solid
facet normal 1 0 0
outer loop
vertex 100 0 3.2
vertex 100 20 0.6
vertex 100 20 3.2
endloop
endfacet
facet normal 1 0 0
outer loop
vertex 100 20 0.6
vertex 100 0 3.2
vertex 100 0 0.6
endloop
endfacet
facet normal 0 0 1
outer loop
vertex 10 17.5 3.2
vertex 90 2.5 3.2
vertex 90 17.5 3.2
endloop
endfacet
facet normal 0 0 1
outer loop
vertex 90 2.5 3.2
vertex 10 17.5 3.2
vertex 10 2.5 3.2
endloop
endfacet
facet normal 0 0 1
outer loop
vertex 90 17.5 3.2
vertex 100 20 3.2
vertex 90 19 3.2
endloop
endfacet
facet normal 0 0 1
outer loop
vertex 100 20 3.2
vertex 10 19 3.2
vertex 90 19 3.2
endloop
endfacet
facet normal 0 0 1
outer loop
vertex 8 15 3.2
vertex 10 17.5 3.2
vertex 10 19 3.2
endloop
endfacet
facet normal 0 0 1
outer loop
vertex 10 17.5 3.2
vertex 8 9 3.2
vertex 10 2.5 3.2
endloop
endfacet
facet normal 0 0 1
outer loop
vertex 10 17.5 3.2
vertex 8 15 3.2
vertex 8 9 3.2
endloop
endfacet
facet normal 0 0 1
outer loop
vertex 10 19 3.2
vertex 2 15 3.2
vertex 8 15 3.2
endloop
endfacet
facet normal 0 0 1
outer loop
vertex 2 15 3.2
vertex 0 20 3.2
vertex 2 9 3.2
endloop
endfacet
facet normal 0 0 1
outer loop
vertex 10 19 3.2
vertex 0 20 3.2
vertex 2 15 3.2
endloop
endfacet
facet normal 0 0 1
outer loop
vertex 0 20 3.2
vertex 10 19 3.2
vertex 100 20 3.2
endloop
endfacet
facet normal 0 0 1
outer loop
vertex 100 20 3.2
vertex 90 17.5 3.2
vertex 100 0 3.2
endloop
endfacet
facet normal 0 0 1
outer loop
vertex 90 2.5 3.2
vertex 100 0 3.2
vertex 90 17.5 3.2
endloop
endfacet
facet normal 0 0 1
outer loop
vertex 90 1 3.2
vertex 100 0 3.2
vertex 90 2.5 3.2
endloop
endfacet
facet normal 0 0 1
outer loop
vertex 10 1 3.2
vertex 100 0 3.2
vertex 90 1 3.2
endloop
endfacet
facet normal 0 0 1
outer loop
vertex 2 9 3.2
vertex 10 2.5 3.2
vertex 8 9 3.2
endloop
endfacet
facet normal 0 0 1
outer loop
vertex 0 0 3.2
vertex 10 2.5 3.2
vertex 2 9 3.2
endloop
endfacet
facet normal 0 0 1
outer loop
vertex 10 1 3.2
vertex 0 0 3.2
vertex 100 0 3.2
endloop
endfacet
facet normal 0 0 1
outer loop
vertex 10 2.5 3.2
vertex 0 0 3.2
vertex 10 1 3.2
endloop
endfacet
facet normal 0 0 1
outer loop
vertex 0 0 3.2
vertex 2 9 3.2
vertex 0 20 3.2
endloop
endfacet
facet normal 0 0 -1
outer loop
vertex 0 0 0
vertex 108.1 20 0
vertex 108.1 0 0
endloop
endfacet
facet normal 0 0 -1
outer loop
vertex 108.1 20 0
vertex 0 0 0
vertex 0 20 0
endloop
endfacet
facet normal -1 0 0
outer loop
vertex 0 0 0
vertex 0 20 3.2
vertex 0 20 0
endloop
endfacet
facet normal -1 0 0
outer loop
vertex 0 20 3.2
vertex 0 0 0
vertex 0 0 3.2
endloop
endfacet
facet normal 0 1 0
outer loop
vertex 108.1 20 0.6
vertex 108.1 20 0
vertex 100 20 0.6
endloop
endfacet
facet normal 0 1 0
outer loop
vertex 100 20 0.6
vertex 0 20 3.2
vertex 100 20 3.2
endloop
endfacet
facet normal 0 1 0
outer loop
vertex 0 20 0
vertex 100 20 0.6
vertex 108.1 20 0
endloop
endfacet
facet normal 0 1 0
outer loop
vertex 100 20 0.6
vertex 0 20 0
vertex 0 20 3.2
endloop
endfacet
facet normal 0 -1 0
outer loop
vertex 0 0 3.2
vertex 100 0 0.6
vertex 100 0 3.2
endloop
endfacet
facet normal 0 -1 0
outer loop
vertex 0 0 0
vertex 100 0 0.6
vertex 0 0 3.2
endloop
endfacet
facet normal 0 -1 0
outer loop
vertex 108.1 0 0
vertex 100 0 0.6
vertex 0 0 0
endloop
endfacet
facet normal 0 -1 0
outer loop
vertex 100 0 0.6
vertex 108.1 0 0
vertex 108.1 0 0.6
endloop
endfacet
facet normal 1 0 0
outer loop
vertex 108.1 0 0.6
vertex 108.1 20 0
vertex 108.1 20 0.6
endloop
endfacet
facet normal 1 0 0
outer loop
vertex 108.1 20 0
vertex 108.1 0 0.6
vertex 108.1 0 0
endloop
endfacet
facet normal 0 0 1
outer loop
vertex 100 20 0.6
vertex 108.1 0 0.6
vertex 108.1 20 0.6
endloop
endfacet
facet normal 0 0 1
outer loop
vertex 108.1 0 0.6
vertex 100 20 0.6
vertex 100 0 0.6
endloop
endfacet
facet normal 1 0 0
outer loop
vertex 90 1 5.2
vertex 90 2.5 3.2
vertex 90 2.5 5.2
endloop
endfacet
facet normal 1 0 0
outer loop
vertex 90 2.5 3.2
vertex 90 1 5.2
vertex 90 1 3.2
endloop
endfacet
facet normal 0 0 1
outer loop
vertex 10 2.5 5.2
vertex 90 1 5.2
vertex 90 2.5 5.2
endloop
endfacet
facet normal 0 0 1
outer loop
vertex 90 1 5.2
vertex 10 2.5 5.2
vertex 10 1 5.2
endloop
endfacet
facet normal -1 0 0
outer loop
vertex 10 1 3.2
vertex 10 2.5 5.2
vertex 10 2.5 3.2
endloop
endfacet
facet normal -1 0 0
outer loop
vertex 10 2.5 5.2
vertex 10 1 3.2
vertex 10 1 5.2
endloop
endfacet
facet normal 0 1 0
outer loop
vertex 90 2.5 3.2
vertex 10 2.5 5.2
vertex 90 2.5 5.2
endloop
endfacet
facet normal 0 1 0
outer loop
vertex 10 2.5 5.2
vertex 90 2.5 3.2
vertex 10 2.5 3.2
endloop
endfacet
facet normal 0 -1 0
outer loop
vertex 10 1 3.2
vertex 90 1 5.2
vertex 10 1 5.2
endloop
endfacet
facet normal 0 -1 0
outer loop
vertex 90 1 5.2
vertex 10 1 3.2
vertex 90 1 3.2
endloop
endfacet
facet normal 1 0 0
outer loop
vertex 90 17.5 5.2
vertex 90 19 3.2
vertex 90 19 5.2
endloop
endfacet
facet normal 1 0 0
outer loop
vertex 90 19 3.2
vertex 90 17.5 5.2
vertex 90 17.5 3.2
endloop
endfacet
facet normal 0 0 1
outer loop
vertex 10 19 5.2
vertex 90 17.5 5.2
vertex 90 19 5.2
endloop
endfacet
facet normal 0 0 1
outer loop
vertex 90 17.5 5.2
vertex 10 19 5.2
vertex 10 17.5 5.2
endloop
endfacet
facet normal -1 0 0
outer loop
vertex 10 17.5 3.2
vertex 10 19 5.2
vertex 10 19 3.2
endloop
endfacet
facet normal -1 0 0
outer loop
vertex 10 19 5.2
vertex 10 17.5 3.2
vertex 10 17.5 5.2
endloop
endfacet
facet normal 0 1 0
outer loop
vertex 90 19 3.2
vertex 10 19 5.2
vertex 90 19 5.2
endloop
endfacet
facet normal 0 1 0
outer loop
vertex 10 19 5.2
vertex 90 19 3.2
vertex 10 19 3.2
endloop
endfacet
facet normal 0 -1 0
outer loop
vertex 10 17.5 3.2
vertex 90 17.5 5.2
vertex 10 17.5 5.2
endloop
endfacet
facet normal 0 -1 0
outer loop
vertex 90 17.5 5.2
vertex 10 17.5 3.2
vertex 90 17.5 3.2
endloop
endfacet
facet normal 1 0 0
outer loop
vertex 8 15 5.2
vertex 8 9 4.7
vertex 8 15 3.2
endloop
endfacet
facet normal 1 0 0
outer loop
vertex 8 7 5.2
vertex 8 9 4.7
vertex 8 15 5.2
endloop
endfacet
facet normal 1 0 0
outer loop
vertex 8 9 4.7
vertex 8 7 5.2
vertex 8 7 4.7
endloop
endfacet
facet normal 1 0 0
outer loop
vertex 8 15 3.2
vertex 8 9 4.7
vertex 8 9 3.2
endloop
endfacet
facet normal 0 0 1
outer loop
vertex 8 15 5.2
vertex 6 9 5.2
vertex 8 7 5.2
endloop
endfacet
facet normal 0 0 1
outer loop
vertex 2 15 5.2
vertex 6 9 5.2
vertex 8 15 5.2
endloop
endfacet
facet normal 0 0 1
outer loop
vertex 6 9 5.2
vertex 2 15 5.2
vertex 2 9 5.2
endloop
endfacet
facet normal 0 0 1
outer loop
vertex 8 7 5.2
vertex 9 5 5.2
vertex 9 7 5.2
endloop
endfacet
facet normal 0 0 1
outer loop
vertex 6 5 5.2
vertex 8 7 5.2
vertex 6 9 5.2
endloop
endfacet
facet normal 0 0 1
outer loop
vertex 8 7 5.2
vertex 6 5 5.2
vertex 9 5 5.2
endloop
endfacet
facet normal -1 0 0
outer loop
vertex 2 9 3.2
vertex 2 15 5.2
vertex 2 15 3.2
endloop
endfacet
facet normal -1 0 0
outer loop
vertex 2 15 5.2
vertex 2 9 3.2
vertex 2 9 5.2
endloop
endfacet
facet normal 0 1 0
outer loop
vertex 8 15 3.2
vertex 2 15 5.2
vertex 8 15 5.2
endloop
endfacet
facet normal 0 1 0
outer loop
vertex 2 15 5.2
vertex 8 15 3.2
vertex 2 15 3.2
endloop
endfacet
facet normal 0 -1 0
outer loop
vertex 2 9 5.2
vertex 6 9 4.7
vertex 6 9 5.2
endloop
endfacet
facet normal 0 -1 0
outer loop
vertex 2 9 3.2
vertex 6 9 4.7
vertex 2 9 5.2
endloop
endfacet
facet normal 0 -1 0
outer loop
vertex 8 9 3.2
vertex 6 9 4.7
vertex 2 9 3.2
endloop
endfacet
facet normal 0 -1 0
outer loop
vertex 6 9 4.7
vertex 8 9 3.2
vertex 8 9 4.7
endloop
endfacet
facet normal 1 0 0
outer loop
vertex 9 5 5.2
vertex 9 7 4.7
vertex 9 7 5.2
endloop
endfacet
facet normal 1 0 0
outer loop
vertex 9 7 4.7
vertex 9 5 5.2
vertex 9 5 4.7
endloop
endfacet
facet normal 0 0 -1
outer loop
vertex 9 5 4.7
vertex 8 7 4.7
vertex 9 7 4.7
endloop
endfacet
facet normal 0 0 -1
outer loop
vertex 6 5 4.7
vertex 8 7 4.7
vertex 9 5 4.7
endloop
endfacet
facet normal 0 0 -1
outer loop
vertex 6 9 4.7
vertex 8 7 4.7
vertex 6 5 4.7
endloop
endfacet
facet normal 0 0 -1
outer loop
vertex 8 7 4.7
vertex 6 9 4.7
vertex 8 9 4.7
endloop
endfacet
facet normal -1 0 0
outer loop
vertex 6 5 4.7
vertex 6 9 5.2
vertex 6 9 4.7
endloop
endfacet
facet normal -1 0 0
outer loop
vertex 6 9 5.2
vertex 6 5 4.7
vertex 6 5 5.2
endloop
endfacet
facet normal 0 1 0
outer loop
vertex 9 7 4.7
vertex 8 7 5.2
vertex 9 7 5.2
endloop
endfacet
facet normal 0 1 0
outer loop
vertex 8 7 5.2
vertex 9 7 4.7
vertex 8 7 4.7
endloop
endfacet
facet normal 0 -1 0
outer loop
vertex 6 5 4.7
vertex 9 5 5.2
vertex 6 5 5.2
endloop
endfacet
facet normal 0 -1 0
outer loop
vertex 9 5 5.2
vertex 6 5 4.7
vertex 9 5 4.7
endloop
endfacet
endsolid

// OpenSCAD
// Bag clip living hinge, PETG, 0.4 nozzle, no supports.
// Two halves contacting at hinge, open flat print pose.
// Fold: rotate upper 180 about [108,10,5.2] -Y. F(x)=216-x, F(z)=10.4-z.

part = "arm_lower"; // [arm_lower, arm_upper, assembly]
cadverify_only = "";

module instance(name, part, unit = 1) {
    echo(cadverify_instance = [name, part, unit]);
    if (cadverify_only == "" || cadverify_only == name) children();
}

module arm_lower() {
    cube([100, 20, 3.2], false);
    translate([99.9, 0, 0]) cube([8.2, 20, 0.6], false);
    translate([10, 1, 3.1]) cube([80, 1.5, 2.1], false);
    translate([10, 17.5, 3.1]) cube([80, 1.5, 2.1], false);
    // stop tower (central)
    translate([2, 9, 3.1]) cube([6, 6, 2.1], false);
    // lower hook base region uses body; hook lip + bridge
    translate([6, 5, 4.7]) cube([3, 2, 0.5], false);
    translate([6, 6.9, 4.7]) cube([2, 2.2, 0.5], false);
}

module arm_upper() {
    cube([8.2, 20, 0.6], false);
    translate([7.9, 0, 0]) cube([100.1, 20, 3.2], false);
    // stop tower (central) local x 102-106 -> folded 2-6
    translate([102, 9, 3.1]) cube([4, 6, 2.1], false);
    // upper hook post (Y 13-15) tall
    translate([102, 13, 3.1]) cube([4, 2, 3.3], false);
    // Y bridge 7-13
    translate([99, 6.9, 5.8]) cube([3.1, 6.2, 0.6], false);
    // upper hook lip (Y 5-7)
    translate([99, 5, 5.8]) cube([3.1, 2, 0.6], false);
    // thumb tab
    translate([107.9, 6, 0]) cube([8.1, 8, 3.2], false);
}

if (part == "arm_lower") {
    echo(cadverify_spec = [
        ["bounds", [[0, 0, 0], [108.1, 20, 5.2]]],
        ["bodies", 1],
        ["through_holes", 0],
        ["support_faces", [["bed", "-z", 1500]]],
        ["overhangs_allowed", [["latch lip", [[5.5, 4.5, 4.5], [9.5, 9.5, 5.5]]]]],
        ["copies", 1],
        ["details", [
            ["arm", "material", [[30, 10, 1.2], [70, 12, 2.0]], 1],
            ["arm_wall", "thickness", [50, 10, 10], [0, 0, -1], 3.2],
            ["hinge", "thickness", [104, 10, 5], [0, 0, -1], 0.6],
            ["rib", "material", [[30, 1.3, 3.8], [70, 2.2, 4.8]], 1],
            ["rib2", "material", [[30, 17.8, 3.8], [70, 18.7, 4.8]], 1],
            ["latch_tower", "material", [[3, 10, 3.8], [7, 14, 5.0]], 1],
            ["latch_lip", "material", [[6.5, 5.5, 4.8], [8.5, 6.5, 5.1]], 1],
            ["bag_slot", "void", [[30, 4, 3.8], [70, 16, 5.0]], 1]
        ]]
    ]);
    arm_lower();
} else if (part == "arm_upper") {
    echo(cadverify_spec = [
        ["bounds", [[0, 0, 0], [116, 20, 6.4]]],
        ["bodies", 1],
        ["through_holes", 0],
        ["support_faces", [["bed", "-z", 1500]]],
        ["overhangs_allowed", [["latch lip", [[98.5, 4.5, 5.6], [102.5, 13.5, 6.6]]]]],
        ["copies", 1],
        ["details", [
            ["arm", "material", [[30, 10, 1.2], [70, 12, 2.0]], 1],
            ["arm_wall", "thickness", [50, 10, 10], [0, 0, -1], 3.2],
            ["hinge", "thickness", [4, 10, 5], [0, 0, -1], 0.6],
            ["latch_tower", "material", [[102.5, 10, 3.8], [105.5, 14, 5.0]], 1],
            ["latch_lip", "material", [[99.5, 5.5, 5.9], [101.5, 6.5, 6.3]], 1],
            ["thumb_tab", "material", [[109, 7, 1.2], [114, 13, 2.0]], 1],
            ["field", "void", [[30, 4, 3.8], [70, 16, 5.0]], 1]
        ]]
    ]);
    arm_upper();
} else if (part == "assembly") {
    echo(cadverify_spec = [
        ["bounds", [[0, 0, 0], [224.1, 20, 6.4]]],
        ["support_faces", [["bed", "-z", 3000]]],
        ["allowed_interferences", [["lower", "upper", "hinge fused"]]],
        ["motions", [
            ["close", ["upper"], "rotate", [108, 10, 5.2], [0, -1, 0], [0, 180],
                ["flex", [["upper", "lower", 1.0, "latch snap"]]],
                ["stops", [180]],
                ["rests", [0, 180]]
            ]
        ]],
        ["assembly_order", [
            [["lower"], [0, 0, 0]],
            [["upper"], [0, 0, -1]]
        ]],
        ["print_in_place", 0.3]
    ]);
    instance("lower", "arm_lower") arm_lower();
    instance("upper", "arm_upper") translate([108, 0, 0]) arm_upper();
}
